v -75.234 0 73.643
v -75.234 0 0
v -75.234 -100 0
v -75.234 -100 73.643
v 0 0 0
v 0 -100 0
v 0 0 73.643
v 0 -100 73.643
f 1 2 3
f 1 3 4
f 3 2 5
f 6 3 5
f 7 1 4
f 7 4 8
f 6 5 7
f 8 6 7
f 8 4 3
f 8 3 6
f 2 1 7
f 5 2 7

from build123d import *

# Parameters (mm, degrees)
F0_W     = 75.23375
F0_H     = 73.643394
F1_DEPTH = 100
F2_R     = 26.794251
F2_R_2   = 13.258237
F3_DEPTH = 75
F4_R     = 26.323193
F5_DEPTH = 50


with BuildPart() as f1:
    # F0 (on Front) → F1 (new body)
    with BuildSketch(Plane.XZ):
        with Locations((-37.616875, 36.821697)):
            Rectangle(F0_W, F0_H)
    extrude(amount=F1_DEPTH)

    # F2 (on face) → F3 (join)
    with BuildSketch(Plane.XZ.offset(100)):
        with Locations((-41.986048, 33.408221)):
            Circle(F2_R)
        with Locations((-41.986048, 33.408221)):
            Circle(F2_R_2, mode=Mode.SUBTRACT)
    extrude(amount=-F3_DEPTH)

    # F4 (on face) → F5 (join)
    with BuildSketch(Plane.XZ.offset(100)):
        with Locations((-41.341685, 35.241015)):
            Circle(F4_R)
    extrude(amount=-F5_DEPTH)


solid = f1.part
